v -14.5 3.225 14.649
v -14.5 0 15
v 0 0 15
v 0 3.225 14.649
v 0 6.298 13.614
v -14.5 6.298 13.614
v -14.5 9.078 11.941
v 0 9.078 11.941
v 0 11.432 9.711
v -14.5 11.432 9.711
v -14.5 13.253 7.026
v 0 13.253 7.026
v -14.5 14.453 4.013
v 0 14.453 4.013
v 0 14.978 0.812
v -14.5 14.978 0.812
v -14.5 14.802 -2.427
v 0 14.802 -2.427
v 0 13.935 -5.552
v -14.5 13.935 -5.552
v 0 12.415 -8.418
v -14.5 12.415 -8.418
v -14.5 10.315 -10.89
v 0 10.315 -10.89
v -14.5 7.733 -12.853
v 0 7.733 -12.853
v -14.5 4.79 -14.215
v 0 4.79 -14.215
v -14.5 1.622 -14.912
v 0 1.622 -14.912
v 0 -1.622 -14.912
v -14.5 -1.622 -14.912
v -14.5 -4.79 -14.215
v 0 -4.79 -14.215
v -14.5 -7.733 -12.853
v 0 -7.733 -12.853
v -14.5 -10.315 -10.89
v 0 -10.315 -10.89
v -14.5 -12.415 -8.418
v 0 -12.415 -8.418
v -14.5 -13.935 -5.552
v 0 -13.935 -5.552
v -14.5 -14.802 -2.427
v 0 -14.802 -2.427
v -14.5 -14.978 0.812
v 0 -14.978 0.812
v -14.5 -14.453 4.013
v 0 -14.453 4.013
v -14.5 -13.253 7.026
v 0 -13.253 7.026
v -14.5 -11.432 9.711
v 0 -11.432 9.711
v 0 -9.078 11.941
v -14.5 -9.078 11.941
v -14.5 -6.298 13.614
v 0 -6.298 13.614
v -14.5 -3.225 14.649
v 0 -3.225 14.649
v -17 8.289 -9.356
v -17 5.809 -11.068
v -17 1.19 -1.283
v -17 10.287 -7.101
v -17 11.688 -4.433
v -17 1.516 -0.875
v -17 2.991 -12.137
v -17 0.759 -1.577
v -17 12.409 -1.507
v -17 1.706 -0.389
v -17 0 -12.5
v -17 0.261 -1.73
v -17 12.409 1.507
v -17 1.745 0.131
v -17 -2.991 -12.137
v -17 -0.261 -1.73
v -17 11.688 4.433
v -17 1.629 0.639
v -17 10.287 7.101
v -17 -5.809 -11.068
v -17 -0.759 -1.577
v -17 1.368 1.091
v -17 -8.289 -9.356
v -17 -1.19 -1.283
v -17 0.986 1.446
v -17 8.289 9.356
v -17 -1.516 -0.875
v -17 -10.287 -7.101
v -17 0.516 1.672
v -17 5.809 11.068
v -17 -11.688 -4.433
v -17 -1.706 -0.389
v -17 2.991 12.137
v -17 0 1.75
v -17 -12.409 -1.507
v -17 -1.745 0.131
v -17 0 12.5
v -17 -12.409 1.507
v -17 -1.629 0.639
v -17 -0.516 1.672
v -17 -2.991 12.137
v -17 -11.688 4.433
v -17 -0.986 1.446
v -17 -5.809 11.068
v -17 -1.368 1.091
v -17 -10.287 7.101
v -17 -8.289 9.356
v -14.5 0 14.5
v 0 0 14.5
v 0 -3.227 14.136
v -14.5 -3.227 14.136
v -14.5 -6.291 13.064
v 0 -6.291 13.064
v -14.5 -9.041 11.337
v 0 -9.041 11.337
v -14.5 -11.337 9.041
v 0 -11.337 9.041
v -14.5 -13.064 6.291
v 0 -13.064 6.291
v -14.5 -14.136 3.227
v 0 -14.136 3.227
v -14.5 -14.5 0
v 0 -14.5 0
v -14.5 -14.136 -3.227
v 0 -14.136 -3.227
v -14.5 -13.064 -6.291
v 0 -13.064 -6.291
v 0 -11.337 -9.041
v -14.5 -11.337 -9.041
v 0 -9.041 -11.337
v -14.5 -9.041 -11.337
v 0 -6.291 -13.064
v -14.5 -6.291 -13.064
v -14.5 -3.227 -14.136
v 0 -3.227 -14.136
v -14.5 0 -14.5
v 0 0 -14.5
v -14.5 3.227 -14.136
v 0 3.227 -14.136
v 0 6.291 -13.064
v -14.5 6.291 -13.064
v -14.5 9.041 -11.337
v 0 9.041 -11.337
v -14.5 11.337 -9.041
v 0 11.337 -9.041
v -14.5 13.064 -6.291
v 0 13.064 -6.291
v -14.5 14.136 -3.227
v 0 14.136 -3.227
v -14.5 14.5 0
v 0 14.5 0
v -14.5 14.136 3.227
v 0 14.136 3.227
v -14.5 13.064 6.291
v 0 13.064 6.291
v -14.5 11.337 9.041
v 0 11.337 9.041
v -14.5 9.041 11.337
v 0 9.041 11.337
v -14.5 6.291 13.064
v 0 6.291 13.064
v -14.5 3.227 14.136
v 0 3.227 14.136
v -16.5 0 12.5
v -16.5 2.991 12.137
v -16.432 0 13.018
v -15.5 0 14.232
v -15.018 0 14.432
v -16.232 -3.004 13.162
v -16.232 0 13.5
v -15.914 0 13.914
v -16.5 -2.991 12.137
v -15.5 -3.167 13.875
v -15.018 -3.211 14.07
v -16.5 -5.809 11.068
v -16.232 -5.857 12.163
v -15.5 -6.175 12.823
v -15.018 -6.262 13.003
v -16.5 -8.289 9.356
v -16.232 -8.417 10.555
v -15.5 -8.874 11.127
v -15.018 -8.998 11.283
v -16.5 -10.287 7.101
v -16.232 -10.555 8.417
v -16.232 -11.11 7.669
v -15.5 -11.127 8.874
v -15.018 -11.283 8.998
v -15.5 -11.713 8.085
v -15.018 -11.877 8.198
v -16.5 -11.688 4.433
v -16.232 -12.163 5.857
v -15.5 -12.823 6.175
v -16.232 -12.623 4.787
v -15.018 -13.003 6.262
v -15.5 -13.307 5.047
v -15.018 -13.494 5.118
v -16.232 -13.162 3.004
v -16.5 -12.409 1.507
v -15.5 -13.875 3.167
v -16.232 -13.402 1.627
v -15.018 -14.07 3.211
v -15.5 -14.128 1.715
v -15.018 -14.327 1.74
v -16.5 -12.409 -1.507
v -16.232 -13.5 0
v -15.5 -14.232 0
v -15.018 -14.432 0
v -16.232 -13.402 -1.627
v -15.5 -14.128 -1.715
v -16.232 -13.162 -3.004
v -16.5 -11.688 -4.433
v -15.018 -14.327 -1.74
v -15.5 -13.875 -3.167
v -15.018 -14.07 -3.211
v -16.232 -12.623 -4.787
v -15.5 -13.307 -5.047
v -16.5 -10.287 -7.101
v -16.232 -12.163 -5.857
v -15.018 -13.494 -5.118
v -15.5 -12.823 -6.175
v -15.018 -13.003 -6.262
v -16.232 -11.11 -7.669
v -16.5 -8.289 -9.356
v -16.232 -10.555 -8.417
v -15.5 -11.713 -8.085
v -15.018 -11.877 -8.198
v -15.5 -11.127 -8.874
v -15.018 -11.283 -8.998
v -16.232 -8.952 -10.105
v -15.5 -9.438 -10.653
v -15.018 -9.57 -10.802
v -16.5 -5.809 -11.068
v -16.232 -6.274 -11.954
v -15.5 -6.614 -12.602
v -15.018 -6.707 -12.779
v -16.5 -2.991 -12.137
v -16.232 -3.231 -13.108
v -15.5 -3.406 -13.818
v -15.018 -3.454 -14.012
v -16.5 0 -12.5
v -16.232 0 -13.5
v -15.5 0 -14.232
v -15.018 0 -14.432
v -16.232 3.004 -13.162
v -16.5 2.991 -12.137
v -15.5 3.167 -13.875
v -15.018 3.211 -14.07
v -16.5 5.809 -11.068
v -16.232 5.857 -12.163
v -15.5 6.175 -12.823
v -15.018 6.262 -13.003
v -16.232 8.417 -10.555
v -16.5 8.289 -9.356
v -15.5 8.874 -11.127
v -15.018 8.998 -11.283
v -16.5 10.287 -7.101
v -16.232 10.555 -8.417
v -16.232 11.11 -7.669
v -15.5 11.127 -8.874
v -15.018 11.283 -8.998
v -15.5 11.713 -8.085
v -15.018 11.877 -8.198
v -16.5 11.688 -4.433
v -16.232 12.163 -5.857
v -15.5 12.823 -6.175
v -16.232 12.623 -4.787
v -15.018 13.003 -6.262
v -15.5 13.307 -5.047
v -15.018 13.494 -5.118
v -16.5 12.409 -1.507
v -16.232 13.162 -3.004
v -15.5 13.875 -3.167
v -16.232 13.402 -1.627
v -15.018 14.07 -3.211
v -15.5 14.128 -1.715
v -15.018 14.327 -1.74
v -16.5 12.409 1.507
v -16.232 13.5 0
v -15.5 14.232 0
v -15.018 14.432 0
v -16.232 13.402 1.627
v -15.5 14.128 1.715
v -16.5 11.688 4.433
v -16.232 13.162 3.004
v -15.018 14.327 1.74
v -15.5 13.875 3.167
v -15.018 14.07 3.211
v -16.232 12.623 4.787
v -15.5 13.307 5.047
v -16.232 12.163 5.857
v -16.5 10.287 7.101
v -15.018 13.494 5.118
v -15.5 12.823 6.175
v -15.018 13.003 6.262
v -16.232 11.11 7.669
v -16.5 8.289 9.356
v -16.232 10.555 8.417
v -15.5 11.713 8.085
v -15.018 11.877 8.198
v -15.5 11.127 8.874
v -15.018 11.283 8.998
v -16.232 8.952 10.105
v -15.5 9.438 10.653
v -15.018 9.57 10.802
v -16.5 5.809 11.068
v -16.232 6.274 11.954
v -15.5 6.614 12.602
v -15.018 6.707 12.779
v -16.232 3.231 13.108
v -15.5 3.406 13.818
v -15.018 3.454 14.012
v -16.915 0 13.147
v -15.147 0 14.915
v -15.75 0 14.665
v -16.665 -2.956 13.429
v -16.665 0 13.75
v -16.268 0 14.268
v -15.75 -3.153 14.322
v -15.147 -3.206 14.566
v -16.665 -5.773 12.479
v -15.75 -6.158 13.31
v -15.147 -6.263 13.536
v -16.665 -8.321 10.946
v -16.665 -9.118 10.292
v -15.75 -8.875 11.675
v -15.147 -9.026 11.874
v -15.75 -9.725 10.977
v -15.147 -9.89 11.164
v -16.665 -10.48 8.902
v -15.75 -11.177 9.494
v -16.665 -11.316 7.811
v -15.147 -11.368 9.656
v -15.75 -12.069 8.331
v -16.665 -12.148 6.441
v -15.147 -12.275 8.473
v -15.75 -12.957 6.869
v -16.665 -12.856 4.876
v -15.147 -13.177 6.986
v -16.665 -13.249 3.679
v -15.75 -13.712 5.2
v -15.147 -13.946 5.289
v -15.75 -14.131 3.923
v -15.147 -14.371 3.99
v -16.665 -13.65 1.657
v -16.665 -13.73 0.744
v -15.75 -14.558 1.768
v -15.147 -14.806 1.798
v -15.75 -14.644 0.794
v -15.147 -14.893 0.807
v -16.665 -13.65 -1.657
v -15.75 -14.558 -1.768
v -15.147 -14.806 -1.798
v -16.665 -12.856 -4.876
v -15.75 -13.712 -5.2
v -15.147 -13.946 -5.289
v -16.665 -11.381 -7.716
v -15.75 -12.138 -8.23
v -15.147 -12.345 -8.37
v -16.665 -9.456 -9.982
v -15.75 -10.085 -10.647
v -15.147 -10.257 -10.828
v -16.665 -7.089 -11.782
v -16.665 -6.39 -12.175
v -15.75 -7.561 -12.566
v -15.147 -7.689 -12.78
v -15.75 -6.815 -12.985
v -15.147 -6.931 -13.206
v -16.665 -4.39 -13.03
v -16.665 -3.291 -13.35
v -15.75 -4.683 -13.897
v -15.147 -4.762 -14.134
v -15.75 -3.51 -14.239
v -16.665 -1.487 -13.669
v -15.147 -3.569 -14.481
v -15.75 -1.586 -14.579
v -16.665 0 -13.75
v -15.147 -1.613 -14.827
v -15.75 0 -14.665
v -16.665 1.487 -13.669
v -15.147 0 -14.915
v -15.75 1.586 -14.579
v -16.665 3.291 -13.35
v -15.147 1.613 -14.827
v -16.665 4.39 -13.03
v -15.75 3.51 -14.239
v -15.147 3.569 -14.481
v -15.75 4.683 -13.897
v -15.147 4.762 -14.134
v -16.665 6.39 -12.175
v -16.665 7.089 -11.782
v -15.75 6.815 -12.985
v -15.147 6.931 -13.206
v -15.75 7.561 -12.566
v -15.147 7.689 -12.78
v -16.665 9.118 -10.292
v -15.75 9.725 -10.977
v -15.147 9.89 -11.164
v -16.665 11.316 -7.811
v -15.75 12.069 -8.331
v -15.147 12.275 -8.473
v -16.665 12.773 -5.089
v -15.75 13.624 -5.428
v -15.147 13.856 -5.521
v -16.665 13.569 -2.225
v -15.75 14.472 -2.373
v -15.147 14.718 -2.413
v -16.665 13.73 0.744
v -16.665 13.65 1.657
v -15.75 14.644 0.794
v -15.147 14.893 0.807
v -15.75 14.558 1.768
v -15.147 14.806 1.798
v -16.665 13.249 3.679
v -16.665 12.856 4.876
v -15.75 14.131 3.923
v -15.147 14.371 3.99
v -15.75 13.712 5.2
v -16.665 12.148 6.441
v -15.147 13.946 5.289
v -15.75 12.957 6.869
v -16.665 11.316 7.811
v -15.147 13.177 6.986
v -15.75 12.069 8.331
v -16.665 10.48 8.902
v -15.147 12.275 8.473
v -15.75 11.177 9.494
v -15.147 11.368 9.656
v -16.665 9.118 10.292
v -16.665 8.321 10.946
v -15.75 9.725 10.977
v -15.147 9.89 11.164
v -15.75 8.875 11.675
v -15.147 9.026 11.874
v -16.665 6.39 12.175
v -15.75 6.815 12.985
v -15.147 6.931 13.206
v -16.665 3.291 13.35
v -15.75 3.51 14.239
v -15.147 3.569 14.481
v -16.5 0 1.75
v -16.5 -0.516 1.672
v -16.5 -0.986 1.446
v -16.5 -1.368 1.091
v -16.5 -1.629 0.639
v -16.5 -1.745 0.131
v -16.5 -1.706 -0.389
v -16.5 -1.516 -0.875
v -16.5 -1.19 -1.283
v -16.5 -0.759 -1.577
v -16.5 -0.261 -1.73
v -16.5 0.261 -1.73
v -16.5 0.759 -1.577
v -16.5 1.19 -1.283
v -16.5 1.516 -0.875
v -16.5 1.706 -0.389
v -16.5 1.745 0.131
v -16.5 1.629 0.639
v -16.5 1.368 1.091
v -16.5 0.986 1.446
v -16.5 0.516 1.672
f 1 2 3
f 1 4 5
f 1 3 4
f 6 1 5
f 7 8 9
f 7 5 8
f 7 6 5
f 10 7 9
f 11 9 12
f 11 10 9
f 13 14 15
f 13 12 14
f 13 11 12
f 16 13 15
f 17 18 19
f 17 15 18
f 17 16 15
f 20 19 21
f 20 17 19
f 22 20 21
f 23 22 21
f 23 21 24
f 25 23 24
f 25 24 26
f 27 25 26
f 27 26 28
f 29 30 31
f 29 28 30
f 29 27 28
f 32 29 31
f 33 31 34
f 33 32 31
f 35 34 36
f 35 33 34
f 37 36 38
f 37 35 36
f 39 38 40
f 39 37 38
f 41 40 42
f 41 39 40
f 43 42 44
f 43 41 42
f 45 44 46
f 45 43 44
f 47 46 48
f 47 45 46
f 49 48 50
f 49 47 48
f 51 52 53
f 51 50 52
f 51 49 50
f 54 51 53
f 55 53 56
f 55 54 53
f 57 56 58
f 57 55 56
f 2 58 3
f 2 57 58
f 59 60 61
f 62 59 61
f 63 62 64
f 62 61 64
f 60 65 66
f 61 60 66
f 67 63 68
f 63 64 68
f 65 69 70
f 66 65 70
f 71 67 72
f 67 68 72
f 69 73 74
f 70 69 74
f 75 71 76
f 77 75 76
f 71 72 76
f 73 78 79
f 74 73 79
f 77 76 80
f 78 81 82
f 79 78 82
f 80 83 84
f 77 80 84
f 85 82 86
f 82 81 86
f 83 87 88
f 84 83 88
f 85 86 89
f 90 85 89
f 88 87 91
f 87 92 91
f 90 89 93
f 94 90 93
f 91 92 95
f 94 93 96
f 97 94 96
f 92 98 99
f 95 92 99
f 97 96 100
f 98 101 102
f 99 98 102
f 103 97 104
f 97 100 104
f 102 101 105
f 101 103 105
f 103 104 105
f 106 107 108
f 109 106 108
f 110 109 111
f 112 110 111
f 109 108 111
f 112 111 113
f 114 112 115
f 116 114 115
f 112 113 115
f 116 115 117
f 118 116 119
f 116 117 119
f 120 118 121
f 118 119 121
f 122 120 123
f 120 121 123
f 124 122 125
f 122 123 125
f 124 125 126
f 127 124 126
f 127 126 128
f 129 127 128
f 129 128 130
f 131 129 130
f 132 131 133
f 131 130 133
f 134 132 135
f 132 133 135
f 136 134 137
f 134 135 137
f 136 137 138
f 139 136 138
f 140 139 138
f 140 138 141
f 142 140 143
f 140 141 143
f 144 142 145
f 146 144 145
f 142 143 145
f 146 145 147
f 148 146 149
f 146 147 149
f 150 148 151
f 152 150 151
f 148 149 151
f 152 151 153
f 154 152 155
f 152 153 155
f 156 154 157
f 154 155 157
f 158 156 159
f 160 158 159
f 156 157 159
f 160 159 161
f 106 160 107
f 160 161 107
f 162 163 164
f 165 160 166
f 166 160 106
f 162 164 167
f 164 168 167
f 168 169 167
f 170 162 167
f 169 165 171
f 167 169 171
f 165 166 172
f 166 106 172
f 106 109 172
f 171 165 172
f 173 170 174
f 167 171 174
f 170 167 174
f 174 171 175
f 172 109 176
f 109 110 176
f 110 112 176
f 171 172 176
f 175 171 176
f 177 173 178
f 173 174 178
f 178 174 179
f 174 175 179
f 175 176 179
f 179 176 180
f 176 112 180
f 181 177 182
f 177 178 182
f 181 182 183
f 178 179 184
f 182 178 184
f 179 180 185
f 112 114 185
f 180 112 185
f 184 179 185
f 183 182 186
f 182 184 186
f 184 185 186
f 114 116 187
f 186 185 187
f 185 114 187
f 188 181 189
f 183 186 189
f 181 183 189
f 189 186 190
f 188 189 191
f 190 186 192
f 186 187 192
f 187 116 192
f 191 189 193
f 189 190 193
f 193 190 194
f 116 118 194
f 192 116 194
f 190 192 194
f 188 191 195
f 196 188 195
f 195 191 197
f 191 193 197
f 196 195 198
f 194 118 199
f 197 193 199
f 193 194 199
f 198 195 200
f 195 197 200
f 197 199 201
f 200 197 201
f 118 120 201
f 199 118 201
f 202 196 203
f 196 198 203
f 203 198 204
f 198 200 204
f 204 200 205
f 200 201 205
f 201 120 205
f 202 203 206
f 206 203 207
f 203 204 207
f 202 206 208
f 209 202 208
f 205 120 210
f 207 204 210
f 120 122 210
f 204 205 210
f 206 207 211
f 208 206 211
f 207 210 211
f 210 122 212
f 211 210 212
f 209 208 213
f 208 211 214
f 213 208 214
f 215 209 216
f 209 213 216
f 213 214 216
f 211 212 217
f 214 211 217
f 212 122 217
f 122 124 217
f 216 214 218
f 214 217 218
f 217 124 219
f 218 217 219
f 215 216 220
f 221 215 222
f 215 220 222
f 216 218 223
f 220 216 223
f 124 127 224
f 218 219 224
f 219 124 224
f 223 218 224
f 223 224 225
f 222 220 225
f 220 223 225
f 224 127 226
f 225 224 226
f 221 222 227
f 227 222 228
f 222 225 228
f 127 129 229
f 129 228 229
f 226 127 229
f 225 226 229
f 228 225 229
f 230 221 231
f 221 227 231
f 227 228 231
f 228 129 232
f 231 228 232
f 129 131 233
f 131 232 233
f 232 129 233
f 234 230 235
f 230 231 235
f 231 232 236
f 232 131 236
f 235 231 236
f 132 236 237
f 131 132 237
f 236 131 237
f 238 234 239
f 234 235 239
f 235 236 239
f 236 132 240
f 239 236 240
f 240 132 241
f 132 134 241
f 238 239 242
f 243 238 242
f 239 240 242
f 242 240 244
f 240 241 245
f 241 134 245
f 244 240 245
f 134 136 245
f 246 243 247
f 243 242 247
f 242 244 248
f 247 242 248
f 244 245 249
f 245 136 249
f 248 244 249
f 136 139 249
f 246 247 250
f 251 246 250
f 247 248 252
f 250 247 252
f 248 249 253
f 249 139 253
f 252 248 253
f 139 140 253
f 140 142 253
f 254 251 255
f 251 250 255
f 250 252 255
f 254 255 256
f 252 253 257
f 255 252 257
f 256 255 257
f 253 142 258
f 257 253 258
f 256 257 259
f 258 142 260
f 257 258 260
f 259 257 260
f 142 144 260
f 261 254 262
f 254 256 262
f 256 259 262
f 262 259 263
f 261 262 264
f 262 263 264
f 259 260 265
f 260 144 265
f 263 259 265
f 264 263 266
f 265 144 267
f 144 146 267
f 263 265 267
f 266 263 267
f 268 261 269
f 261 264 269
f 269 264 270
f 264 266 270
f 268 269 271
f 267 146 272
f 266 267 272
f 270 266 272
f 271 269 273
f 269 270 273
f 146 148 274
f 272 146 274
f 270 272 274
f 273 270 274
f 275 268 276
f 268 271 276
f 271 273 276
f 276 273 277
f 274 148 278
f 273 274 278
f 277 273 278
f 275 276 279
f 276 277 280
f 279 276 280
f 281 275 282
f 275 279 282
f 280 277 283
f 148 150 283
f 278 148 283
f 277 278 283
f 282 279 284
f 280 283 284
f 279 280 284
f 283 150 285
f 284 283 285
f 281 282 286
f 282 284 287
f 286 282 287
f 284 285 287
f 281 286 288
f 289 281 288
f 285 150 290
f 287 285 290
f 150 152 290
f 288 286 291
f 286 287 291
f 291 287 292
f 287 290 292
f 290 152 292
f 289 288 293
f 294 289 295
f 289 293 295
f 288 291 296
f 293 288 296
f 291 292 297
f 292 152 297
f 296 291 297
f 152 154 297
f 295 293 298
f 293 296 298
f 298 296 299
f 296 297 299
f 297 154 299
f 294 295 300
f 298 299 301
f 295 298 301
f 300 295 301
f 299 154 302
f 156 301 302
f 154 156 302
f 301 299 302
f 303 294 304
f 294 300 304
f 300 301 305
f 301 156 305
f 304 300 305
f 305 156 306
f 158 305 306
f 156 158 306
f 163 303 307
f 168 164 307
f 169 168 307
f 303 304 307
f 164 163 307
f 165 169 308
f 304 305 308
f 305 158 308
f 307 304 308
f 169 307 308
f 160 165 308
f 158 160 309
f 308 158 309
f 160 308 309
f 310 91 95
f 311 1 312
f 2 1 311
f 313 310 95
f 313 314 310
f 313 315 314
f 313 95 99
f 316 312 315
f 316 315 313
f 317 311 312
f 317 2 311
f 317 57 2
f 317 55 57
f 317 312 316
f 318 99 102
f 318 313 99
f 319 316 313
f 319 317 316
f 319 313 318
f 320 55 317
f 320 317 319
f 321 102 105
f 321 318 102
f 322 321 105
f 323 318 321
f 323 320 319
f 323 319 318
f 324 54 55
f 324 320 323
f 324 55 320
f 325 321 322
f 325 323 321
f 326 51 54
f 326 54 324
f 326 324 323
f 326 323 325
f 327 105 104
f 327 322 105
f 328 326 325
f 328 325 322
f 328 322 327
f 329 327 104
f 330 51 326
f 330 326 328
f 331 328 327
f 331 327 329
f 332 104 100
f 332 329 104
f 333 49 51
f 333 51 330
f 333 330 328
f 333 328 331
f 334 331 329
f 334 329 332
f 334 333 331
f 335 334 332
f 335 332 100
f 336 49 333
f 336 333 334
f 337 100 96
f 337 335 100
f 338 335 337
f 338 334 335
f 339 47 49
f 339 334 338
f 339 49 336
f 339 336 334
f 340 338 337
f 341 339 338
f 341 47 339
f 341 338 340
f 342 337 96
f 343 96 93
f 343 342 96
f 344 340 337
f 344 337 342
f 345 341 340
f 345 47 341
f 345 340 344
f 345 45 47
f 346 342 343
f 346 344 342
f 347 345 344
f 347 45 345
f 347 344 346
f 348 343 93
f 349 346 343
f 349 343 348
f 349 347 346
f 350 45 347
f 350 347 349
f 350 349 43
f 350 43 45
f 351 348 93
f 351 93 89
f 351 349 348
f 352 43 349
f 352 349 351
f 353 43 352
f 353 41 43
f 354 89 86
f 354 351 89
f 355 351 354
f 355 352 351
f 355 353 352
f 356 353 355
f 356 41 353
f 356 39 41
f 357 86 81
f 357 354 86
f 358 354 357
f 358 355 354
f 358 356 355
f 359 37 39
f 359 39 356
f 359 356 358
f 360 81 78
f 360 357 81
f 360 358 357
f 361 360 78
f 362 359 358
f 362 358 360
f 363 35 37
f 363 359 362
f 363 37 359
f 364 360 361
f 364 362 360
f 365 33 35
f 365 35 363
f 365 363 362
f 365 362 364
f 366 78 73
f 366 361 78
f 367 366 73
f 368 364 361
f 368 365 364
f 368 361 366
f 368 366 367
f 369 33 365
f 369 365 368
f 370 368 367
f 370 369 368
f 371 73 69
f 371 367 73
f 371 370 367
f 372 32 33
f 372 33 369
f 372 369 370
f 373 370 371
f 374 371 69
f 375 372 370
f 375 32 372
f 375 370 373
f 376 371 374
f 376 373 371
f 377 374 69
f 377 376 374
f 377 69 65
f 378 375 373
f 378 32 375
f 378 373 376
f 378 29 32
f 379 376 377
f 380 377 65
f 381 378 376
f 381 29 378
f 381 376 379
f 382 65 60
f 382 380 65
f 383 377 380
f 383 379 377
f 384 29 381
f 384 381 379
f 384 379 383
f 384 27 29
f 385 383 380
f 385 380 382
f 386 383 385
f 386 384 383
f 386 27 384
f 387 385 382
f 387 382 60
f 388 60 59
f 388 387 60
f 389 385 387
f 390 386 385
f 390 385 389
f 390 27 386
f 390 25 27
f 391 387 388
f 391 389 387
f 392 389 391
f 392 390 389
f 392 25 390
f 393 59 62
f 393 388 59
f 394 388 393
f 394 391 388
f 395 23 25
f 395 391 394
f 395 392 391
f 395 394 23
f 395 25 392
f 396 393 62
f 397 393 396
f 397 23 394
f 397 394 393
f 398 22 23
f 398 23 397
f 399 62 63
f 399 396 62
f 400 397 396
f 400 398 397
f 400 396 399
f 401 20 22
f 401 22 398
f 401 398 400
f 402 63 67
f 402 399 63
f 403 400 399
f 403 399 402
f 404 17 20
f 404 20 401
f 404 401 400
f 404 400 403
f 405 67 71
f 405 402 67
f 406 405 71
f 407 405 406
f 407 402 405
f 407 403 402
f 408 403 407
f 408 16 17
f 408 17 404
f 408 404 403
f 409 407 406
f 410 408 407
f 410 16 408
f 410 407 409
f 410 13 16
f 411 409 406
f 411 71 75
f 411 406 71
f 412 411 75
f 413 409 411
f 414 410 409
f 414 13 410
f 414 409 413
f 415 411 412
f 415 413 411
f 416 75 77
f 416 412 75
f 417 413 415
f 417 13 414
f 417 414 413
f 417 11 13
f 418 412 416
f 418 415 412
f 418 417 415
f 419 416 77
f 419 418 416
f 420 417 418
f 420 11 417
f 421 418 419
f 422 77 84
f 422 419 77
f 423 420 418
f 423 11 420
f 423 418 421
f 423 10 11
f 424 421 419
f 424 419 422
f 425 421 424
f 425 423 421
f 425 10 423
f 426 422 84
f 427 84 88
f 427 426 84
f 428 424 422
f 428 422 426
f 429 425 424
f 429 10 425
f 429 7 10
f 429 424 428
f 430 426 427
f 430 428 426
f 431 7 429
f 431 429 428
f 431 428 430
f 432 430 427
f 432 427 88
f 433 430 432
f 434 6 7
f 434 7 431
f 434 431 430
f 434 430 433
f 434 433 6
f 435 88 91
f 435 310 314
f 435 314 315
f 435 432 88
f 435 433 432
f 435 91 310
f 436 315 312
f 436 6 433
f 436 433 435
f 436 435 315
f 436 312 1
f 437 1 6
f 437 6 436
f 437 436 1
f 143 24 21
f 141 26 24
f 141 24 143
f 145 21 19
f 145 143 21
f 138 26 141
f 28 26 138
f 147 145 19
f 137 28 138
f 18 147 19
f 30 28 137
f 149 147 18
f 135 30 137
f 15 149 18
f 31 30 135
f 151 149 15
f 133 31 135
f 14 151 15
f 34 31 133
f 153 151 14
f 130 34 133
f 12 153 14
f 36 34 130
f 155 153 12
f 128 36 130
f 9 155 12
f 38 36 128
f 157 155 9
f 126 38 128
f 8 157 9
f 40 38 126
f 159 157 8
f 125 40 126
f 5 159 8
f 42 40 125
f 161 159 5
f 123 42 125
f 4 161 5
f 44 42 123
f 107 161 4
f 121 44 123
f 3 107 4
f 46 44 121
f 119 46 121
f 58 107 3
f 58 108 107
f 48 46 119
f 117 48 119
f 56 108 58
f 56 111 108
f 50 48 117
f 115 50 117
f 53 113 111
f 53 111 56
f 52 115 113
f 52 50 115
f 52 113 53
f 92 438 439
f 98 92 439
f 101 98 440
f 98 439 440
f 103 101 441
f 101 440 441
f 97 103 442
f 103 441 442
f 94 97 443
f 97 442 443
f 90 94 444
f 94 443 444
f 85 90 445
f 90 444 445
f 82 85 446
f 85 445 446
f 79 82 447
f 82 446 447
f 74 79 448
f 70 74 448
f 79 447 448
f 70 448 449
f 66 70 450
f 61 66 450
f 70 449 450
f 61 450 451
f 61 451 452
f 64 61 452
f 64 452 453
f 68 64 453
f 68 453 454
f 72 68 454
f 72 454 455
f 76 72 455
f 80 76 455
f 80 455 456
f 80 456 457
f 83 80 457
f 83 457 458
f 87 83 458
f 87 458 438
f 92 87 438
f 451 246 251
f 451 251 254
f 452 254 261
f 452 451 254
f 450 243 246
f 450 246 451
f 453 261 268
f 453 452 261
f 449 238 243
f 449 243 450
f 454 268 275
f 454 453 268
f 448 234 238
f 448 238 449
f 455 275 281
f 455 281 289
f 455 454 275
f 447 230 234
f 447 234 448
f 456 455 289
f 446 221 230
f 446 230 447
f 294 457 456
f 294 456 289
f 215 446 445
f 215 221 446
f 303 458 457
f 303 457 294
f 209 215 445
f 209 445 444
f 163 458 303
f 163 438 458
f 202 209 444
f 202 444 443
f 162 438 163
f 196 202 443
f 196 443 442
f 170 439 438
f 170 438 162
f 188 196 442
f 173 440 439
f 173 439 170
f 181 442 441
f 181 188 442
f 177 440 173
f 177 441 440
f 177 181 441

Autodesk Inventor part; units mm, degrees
ref_plane "YZ Plane" through (0, 0, 0) normal (1, 0, 0) x (0, 1, 0)
ref_plane "XZ Plane" through (0, 0, 0) normal (0, 1, 0) x (-1, 0, 0)
ref_plane "XY Plane" through (0, 0, 0) normal (0, 0, 1) x (1, 0, 0)
sketch "Эскиз1" plane through (0, 0, 0) normal (0, 1, 0) x (-1, 0, 0)
  line L0 (0, 0) -> (0, 15) construction
  line L1 (0, 15) -> (14.5, 15)
  line L2 (17, 12.5) -> (17, 1.75)
  line L3 (17, 1.75) -> (16.5, 1.75)
  line L4 (16.5, 1.75) -> (16.5, 12.5)
  line L5 (14.5, 14.5) -> (0, 14.5)
  line L6 (0, 14.5) -> (0, 15)
  arc A0 (16.5, 12.5) -> (14.5, 14.5) centre (14.5, 12.5) ccw
  arc A1 (17, 12.5) -> (14.5, 15) centre (14.5, 12.5) ccw
  line L7 (21.0213, 0) -> (-3.5036, 0) projected
  point P0 (17, 15)
  point P1 (16.5, 14.5)
  dimension "d0" = 15
  dimension "d1" = 17
  dimension "d2" = 13.25
  dimension "d3" = 0.5
  dimension "d4" = 12.75
  dimension "d5" = 2
  dimension "d6" = 2.5
revolve "Вращение1" add sketch "Эскиз1" angle 360 about axis through (-10, 0, 0) along (1, 0, 0)
properties part number "Кожух"
